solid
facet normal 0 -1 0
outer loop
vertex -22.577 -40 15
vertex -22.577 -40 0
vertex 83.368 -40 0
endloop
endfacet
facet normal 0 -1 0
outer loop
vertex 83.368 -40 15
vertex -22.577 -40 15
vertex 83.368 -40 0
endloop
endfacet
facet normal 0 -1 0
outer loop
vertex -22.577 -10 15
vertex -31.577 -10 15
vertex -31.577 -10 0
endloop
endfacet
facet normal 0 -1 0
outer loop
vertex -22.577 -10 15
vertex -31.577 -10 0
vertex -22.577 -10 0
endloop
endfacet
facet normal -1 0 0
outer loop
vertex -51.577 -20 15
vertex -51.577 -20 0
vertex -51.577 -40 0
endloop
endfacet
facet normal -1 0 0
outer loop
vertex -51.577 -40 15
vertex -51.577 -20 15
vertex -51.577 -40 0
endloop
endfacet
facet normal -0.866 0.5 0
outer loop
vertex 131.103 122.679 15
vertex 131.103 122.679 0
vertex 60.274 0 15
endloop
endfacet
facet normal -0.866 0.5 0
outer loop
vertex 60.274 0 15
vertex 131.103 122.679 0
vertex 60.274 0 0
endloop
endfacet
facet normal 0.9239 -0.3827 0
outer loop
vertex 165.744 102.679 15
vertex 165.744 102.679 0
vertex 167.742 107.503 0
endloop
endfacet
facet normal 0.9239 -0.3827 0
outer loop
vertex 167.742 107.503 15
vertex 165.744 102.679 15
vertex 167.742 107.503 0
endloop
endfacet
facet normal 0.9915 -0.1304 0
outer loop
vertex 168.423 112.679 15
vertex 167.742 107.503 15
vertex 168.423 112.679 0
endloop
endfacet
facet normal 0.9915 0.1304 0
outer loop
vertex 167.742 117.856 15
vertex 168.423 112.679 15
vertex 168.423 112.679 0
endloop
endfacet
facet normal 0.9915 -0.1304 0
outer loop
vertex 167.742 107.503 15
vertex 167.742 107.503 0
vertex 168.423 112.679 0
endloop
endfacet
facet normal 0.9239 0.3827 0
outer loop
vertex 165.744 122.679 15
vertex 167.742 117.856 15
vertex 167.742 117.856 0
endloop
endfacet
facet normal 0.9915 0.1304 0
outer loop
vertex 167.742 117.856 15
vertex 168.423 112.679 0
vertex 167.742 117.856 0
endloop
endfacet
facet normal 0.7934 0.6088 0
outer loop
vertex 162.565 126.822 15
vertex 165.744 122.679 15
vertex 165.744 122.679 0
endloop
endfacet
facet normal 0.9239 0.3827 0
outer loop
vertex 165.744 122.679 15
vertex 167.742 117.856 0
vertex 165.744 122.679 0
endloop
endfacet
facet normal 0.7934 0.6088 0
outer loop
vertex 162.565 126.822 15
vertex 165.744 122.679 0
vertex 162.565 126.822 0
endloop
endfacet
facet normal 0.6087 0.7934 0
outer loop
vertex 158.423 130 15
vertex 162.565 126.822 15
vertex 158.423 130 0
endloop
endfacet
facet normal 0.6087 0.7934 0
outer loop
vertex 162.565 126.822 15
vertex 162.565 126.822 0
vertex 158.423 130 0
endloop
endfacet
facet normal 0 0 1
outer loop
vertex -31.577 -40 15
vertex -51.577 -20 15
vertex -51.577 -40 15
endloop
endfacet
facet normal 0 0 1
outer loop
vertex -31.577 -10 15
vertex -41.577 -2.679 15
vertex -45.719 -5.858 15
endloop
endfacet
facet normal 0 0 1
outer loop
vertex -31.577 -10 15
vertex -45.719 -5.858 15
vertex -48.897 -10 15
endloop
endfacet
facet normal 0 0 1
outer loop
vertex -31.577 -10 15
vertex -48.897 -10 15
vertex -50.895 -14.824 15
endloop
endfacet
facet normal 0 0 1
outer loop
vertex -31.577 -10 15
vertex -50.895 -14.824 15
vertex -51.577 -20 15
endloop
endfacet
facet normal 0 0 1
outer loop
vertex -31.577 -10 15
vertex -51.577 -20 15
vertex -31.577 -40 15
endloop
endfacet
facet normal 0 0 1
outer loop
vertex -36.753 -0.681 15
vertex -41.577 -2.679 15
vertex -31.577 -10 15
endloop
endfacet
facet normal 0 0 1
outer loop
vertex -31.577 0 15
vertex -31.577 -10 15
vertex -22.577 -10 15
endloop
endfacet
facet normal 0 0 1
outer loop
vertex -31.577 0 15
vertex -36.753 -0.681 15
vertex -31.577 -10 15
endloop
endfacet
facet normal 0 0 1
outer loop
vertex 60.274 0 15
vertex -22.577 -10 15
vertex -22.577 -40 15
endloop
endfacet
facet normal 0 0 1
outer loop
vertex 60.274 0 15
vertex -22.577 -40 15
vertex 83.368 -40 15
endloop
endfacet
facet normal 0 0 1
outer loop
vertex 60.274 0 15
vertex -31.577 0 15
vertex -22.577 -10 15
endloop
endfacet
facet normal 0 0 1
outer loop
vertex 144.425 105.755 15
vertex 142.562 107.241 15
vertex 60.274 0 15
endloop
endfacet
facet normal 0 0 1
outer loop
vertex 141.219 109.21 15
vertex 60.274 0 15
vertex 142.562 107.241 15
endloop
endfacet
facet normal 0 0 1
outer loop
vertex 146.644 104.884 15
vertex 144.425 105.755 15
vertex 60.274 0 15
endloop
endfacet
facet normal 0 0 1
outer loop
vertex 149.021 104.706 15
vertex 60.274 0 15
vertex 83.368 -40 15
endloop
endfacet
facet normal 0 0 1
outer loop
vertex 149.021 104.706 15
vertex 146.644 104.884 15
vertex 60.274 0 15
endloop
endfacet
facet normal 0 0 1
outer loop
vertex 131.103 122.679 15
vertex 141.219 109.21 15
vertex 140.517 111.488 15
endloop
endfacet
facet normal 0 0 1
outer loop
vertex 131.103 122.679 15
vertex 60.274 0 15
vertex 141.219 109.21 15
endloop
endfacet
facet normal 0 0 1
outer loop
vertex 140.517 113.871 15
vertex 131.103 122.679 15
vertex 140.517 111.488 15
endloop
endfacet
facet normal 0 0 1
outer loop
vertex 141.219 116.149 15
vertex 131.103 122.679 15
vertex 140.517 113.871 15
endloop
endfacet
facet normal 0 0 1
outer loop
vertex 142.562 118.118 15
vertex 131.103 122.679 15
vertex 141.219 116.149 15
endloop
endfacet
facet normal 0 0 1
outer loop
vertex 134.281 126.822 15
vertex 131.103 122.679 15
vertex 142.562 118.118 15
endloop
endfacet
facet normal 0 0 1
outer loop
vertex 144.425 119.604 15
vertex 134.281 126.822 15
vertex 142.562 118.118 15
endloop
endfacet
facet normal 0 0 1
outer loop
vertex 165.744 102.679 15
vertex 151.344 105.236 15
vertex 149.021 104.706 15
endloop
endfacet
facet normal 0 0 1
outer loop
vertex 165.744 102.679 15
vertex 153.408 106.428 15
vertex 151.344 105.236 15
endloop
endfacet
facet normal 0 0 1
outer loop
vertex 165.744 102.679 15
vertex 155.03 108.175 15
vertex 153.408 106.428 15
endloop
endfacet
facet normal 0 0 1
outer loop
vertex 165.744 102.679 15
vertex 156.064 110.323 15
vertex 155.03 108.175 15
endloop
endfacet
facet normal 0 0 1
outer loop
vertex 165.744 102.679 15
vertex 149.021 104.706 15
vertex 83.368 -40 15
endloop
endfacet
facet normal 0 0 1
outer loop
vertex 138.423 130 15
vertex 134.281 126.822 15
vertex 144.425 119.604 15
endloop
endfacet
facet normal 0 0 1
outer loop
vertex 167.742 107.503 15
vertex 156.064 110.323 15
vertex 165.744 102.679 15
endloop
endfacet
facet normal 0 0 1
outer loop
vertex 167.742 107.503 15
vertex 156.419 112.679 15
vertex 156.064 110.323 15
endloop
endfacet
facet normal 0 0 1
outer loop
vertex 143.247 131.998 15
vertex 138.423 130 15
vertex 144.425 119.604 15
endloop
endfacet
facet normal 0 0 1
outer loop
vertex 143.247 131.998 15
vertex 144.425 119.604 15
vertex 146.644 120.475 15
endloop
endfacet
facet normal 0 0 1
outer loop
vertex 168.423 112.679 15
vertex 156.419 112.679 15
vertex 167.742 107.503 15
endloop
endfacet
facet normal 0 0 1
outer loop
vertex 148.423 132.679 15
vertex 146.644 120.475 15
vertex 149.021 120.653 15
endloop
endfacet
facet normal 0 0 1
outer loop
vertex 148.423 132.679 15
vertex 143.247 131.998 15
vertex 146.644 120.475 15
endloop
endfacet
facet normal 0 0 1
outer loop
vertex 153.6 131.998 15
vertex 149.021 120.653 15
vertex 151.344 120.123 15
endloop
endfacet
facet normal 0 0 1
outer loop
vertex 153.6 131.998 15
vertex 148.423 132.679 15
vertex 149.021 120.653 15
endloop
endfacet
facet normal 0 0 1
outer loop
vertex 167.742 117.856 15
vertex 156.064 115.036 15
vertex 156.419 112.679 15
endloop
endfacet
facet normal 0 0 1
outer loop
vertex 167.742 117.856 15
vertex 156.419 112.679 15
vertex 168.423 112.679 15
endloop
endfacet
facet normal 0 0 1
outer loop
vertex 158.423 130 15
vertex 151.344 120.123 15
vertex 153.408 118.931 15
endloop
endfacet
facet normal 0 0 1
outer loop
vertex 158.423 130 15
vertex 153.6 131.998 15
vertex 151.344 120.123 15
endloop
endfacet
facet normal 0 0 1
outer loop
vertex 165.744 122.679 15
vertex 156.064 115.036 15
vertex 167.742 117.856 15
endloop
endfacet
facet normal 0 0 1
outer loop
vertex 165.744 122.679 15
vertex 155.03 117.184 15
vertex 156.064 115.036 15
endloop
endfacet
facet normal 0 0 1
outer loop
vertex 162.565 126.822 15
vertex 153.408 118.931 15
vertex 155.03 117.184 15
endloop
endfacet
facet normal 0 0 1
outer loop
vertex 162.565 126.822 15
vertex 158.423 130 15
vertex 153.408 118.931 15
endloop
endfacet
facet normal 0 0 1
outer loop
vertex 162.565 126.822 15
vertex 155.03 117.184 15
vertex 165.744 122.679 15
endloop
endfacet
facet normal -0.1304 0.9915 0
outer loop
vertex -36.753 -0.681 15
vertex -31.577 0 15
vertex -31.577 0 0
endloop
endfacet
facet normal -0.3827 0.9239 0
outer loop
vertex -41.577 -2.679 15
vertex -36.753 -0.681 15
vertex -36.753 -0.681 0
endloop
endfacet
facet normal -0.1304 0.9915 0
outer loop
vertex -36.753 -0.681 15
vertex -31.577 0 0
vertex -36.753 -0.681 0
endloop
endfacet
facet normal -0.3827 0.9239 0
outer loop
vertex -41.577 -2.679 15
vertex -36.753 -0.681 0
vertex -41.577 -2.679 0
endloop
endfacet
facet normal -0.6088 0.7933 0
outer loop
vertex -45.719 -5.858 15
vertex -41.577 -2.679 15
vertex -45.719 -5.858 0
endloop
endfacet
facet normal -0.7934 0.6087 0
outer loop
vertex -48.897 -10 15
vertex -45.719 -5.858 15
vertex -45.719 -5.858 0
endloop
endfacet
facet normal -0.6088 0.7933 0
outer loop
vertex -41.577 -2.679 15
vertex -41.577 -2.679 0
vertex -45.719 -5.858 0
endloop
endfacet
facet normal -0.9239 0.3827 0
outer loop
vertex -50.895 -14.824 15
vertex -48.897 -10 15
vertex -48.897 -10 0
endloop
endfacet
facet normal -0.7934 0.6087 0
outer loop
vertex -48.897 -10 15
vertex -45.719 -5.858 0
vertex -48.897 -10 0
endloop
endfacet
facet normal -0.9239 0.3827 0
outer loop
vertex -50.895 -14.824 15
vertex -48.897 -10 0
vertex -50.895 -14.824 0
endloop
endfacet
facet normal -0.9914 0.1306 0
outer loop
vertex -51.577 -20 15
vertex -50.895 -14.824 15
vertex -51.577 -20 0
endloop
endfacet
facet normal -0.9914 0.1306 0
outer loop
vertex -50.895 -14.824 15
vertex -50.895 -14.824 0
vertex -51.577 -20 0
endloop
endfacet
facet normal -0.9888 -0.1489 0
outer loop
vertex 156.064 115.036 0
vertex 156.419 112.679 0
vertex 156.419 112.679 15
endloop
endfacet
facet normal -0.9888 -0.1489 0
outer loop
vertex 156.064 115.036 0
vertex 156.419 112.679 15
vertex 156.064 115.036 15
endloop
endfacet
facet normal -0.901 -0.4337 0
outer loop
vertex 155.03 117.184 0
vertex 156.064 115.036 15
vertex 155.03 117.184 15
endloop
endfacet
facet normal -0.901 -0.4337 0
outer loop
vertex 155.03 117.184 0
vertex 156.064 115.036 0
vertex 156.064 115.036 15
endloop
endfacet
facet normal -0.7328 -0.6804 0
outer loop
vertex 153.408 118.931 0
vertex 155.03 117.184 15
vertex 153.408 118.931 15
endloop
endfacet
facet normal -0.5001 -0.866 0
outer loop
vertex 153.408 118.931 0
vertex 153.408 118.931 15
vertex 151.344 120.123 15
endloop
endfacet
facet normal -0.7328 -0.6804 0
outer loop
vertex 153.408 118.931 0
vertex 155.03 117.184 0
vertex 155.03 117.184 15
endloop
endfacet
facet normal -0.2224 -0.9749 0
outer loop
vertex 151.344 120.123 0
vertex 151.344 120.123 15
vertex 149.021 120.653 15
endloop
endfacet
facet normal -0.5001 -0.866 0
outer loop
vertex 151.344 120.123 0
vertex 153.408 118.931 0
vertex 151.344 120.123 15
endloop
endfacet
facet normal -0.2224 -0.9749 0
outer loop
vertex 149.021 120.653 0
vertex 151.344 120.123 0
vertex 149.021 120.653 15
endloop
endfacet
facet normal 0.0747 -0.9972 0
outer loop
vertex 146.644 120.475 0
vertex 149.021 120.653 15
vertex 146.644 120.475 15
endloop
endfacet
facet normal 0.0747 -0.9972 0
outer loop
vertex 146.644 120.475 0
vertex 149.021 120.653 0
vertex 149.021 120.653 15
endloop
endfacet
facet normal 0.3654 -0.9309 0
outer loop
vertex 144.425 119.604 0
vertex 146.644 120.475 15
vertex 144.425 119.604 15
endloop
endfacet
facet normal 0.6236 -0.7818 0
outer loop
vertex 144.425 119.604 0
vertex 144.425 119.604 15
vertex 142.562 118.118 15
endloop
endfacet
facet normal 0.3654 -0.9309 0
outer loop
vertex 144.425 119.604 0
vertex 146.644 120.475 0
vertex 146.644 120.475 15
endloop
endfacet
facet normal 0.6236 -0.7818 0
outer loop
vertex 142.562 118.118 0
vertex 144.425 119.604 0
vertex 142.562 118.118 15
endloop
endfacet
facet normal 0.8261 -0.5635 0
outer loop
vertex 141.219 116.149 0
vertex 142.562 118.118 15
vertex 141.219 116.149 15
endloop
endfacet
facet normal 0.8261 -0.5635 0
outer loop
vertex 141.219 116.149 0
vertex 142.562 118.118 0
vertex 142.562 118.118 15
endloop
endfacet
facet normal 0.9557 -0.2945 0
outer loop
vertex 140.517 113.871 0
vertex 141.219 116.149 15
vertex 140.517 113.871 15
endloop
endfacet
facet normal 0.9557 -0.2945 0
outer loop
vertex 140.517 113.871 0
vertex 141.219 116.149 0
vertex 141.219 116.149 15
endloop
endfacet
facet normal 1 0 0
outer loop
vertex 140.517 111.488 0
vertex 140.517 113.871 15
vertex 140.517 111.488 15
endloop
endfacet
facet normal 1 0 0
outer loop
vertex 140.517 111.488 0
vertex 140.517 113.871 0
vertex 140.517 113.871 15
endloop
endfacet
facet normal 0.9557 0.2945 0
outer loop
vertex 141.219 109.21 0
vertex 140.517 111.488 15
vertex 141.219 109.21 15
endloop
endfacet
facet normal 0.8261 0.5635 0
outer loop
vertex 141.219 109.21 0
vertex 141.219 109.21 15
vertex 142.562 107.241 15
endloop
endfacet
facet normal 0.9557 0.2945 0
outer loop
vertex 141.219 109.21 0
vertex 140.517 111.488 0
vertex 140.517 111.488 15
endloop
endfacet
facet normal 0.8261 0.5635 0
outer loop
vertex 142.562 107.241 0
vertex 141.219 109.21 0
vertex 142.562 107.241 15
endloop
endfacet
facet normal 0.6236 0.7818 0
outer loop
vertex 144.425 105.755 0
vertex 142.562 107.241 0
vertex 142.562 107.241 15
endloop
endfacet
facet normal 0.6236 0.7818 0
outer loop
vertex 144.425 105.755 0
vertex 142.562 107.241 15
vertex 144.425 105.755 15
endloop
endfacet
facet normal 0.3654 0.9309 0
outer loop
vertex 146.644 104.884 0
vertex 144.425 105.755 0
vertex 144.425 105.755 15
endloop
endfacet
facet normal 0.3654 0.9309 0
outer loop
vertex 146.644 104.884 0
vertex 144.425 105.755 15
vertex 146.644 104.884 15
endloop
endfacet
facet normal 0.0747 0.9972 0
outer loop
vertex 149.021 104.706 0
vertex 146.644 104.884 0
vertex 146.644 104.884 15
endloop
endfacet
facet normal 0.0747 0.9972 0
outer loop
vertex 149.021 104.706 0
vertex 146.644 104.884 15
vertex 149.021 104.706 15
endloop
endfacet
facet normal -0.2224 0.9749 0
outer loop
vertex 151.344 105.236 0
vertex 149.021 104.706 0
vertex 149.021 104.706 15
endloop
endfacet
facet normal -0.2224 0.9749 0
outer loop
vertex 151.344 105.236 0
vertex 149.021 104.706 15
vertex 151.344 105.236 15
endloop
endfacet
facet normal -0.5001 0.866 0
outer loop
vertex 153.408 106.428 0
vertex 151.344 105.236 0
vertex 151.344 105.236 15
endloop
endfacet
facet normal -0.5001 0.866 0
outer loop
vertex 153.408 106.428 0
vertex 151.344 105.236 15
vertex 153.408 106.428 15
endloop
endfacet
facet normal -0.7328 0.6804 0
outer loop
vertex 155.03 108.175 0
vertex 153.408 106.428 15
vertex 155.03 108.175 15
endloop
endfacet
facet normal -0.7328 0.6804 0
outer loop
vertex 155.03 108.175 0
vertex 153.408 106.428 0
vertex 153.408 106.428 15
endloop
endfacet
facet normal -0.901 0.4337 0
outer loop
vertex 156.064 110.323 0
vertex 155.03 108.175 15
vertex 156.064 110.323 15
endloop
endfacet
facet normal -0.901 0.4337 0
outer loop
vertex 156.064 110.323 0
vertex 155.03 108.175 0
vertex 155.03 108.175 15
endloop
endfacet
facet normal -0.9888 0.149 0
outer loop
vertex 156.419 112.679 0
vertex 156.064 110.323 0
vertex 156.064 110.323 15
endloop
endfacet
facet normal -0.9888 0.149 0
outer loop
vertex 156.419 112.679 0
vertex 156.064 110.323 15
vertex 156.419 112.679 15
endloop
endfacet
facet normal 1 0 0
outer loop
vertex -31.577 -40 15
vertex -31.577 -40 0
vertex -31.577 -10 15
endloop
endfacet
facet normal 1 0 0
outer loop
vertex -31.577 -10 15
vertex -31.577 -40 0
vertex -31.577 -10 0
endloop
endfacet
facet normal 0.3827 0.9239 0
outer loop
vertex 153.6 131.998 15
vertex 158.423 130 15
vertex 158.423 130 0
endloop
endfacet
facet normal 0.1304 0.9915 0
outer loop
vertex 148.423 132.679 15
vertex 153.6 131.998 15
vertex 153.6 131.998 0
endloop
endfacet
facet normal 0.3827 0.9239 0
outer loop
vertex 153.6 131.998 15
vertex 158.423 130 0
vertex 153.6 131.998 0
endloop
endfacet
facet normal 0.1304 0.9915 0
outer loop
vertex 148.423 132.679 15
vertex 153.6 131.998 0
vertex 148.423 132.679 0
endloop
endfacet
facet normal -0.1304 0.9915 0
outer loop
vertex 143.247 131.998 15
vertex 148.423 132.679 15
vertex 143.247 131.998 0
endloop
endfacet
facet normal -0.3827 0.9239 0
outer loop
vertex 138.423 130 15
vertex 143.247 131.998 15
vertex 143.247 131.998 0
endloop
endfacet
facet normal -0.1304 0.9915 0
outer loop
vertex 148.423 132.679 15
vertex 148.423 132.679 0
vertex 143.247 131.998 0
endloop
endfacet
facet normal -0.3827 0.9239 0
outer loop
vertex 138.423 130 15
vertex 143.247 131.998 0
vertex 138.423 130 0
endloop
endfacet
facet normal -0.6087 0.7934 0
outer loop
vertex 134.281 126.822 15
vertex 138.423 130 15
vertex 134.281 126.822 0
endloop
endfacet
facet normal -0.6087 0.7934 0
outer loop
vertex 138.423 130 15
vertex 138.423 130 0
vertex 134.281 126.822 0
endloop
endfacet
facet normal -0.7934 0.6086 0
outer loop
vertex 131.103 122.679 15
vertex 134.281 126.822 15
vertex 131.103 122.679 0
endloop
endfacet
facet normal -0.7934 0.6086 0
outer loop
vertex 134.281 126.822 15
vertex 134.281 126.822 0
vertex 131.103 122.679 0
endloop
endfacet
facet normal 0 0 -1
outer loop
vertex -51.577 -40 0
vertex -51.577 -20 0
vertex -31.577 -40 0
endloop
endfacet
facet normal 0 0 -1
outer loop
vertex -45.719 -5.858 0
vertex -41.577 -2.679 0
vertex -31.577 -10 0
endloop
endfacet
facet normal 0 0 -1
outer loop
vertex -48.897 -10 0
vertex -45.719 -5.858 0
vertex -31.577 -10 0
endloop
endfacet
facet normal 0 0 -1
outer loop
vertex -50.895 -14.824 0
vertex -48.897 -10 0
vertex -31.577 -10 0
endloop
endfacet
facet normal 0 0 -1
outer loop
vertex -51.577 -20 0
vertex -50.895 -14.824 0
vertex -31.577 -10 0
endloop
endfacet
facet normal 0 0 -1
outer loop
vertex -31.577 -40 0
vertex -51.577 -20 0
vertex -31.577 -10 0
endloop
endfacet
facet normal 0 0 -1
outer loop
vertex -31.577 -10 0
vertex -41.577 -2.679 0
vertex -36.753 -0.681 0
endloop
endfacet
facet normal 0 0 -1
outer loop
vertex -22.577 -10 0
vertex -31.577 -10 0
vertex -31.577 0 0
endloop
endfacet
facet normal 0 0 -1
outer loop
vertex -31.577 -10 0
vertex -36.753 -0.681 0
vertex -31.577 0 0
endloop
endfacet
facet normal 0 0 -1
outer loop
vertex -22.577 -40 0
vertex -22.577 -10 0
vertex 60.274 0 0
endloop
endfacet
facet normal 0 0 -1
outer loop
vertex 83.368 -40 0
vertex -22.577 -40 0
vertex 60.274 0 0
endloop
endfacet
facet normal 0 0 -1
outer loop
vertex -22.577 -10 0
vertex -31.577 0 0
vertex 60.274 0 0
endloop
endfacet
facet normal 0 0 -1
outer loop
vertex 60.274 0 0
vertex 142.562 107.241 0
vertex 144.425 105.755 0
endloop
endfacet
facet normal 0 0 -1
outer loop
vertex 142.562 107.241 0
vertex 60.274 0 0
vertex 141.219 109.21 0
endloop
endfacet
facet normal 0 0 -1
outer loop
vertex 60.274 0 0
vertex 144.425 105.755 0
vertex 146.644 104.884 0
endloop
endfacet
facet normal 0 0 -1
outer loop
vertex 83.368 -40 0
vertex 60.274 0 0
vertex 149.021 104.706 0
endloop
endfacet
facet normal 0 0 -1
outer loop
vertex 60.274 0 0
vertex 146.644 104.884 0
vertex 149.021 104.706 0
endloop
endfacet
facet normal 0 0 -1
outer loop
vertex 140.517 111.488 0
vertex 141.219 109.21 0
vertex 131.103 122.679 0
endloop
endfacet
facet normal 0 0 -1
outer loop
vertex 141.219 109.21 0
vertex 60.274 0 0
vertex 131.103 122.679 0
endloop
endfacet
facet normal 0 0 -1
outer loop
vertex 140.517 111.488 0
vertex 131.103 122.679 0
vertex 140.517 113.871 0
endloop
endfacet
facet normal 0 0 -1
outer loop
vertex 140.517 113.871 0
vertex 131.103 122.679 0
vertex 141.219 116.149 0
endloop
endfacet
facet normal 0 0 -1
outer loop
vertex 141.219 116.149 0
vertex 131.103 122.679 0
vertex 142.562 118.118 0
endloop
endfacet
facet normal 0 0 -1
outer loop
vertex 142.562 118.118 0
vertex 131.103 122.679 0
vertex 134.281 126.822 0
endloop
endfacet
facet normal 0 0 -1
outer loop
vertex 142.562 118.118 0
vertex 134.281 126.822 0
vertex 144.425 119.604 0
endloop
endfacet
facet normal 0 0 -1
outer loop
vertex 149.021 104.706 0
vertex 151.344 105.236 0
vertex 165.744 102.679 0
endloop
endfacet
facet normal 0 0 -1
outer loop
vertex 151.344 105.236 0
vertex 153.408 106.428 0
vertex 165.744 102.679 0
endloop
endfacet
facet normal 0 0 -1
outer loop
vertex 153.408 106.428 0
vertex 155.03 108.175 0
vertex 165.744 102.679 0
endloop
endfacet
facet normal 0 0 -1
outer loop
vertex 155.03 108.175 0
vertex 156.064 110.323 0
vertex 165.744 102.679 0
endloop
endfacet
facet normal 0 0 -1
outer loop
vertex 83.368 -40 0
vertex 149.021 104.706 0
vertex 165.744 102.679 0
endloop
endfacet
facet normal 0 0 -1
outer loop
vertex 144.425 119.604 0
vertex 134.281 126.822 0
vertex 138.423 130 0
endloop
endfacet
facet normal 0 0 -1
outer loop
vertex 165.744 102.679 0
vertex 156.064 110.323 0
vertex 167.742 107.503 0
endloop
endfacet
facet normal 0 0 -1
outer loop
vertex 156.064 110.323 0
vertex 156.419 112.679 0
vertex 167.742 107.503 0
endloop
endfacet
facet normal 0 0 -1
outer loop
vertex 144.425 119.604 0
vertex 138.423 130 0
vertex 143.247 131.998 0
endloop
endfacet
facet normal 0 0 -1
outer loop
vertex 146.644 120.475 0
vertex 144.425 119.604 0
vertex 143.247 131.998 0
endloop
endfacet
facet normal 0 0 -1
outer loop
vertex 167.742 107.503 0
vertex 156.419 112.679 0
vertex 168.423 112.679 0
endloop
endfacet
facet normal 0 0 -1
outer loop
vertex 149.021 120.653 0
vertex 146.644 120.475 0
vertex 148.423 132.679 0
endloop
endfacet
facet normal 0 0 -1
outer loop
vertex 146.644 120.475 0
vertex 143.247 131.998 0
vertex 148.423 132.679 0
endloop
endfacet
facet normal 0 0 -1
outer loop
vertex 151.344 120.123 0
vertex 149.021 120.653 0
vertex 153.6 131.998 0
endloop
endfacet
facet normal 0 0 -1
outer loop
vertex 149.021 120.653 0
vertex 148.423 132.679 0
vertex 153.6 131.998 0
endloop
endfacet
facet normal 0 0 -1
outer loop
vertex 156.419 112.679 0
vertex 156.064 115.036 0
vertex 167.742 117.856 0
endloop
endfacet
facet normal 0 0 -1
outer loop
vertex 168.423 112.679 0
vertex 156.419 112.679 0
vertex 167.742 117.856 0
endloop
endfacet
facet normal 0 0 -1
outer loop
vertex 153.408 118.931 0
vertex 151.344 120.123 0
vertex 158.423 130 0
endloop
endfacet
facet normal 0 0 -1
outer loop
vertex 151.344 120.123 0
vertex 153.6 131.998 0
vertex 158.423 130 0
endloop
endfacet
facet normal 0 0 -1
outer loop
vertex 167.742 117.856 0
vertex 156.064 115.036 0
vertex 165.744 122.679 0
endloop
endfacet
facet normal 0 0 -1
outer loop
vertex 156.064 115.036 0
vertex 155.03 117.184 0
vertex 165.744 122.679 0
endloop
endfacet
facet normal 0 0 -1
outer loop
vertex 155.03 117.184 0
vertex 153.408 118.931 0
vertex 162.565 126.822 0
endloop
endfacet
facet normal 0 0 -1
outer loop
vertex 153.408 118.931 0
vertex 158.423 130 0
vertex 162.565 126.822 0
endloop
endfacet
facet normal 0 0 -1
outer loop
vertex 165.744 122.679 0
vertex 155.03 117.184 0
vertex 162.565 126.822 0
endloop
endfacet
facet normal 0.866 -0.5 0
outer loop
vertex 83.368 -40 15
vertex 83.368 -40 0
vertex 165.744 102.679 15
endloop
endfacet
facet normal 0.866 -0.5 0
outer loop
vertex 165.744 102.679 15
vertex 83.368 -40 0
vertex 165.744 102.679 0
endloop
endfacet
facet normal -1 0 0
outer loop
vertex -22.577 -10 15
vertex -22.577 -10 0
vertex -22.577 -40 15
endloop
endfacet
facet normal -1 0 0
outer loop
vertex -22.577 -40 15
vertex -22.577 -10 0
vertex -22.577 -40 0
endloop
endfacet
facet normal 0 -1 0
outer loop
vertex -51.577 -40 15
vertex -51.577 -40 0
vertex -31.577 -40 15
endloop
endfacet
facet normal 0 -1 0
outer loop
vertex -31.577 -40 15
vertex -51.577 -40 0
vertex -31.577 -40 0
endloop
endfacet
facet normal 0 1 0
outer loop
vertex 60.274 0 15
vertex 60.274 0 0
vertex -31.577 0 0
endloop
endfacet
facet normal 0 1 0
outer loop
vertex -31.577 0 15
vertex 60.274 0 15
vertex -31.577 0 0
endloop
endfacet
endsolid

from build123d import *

# Parameters (mm, degrees)
F0_R     = 7.9957240037
F1_DEPTH = 15


# Not quite as in the source:
# - a feature names something its author has since deleted; it is built from what else it names


with BuildPart() as f1:
    # F0 (on Top) → F1 (new body)
    with BuildSketch(Plane.XY):
        with BuildLine():
            Line((60.2735915523, 0), (-31.5768626855, 0))
            ThreePointArc((-31.5768626855, 0), (-45.7189983092, -5.8578643763), (-51.5768626855, -20))
            Line((-51.5768626855, -20), (-51.5768626855, -40))
            Line((-51.5768626855, -40), (-31.5768626855, -40))
            Line((-31.5768626855, -40), (-31.5768626855, -10))
            Line((-31.5768626855, -10), (-22.5768626855, -10))
            Line((-22.5768626855, -10), (-22.5768626855, -40))
            Line((-22.5768626855, -40), (83.3676023199, -40))
            Line((83.3676023199, -40), (83.3676023199, -20))
            Line((83.3676023199, -20), (83.3676023199, 0))
            Line((83.3676023199, 0), (60.2735915523, 0))
        make_face()
        with BuildLine():
            Line((131.1026292389, 122.6794919243), (60.2735915523, 0))
            Line((60.2735915523, 0), (83.3676023199, 0))
            Line((83.3676023199, 0), (83.3676023199, -20))
            Line((83.3676023199, -20), (83.3676023199, -40))
            Line((83.3676023199, -40), (165.7436453902, 102.6794919243))
            ThreePointArc((165.7436453902, 102.6794919243), (167.7416538403, 117.8558728264), (158.4231373145, 130))
            ThreePointArc((158.4231373145, 130), (143.2467564125, 131.9980084501), (131.1026292389, 122.6794919243))
        make_face()
        with Locations((148.4231373145, 112.6794919243)):
            Circle(F0_R, mode=Mode.SUBTRACT)
    extrude(amount=F1_DEPTH)


solid = f1.part
